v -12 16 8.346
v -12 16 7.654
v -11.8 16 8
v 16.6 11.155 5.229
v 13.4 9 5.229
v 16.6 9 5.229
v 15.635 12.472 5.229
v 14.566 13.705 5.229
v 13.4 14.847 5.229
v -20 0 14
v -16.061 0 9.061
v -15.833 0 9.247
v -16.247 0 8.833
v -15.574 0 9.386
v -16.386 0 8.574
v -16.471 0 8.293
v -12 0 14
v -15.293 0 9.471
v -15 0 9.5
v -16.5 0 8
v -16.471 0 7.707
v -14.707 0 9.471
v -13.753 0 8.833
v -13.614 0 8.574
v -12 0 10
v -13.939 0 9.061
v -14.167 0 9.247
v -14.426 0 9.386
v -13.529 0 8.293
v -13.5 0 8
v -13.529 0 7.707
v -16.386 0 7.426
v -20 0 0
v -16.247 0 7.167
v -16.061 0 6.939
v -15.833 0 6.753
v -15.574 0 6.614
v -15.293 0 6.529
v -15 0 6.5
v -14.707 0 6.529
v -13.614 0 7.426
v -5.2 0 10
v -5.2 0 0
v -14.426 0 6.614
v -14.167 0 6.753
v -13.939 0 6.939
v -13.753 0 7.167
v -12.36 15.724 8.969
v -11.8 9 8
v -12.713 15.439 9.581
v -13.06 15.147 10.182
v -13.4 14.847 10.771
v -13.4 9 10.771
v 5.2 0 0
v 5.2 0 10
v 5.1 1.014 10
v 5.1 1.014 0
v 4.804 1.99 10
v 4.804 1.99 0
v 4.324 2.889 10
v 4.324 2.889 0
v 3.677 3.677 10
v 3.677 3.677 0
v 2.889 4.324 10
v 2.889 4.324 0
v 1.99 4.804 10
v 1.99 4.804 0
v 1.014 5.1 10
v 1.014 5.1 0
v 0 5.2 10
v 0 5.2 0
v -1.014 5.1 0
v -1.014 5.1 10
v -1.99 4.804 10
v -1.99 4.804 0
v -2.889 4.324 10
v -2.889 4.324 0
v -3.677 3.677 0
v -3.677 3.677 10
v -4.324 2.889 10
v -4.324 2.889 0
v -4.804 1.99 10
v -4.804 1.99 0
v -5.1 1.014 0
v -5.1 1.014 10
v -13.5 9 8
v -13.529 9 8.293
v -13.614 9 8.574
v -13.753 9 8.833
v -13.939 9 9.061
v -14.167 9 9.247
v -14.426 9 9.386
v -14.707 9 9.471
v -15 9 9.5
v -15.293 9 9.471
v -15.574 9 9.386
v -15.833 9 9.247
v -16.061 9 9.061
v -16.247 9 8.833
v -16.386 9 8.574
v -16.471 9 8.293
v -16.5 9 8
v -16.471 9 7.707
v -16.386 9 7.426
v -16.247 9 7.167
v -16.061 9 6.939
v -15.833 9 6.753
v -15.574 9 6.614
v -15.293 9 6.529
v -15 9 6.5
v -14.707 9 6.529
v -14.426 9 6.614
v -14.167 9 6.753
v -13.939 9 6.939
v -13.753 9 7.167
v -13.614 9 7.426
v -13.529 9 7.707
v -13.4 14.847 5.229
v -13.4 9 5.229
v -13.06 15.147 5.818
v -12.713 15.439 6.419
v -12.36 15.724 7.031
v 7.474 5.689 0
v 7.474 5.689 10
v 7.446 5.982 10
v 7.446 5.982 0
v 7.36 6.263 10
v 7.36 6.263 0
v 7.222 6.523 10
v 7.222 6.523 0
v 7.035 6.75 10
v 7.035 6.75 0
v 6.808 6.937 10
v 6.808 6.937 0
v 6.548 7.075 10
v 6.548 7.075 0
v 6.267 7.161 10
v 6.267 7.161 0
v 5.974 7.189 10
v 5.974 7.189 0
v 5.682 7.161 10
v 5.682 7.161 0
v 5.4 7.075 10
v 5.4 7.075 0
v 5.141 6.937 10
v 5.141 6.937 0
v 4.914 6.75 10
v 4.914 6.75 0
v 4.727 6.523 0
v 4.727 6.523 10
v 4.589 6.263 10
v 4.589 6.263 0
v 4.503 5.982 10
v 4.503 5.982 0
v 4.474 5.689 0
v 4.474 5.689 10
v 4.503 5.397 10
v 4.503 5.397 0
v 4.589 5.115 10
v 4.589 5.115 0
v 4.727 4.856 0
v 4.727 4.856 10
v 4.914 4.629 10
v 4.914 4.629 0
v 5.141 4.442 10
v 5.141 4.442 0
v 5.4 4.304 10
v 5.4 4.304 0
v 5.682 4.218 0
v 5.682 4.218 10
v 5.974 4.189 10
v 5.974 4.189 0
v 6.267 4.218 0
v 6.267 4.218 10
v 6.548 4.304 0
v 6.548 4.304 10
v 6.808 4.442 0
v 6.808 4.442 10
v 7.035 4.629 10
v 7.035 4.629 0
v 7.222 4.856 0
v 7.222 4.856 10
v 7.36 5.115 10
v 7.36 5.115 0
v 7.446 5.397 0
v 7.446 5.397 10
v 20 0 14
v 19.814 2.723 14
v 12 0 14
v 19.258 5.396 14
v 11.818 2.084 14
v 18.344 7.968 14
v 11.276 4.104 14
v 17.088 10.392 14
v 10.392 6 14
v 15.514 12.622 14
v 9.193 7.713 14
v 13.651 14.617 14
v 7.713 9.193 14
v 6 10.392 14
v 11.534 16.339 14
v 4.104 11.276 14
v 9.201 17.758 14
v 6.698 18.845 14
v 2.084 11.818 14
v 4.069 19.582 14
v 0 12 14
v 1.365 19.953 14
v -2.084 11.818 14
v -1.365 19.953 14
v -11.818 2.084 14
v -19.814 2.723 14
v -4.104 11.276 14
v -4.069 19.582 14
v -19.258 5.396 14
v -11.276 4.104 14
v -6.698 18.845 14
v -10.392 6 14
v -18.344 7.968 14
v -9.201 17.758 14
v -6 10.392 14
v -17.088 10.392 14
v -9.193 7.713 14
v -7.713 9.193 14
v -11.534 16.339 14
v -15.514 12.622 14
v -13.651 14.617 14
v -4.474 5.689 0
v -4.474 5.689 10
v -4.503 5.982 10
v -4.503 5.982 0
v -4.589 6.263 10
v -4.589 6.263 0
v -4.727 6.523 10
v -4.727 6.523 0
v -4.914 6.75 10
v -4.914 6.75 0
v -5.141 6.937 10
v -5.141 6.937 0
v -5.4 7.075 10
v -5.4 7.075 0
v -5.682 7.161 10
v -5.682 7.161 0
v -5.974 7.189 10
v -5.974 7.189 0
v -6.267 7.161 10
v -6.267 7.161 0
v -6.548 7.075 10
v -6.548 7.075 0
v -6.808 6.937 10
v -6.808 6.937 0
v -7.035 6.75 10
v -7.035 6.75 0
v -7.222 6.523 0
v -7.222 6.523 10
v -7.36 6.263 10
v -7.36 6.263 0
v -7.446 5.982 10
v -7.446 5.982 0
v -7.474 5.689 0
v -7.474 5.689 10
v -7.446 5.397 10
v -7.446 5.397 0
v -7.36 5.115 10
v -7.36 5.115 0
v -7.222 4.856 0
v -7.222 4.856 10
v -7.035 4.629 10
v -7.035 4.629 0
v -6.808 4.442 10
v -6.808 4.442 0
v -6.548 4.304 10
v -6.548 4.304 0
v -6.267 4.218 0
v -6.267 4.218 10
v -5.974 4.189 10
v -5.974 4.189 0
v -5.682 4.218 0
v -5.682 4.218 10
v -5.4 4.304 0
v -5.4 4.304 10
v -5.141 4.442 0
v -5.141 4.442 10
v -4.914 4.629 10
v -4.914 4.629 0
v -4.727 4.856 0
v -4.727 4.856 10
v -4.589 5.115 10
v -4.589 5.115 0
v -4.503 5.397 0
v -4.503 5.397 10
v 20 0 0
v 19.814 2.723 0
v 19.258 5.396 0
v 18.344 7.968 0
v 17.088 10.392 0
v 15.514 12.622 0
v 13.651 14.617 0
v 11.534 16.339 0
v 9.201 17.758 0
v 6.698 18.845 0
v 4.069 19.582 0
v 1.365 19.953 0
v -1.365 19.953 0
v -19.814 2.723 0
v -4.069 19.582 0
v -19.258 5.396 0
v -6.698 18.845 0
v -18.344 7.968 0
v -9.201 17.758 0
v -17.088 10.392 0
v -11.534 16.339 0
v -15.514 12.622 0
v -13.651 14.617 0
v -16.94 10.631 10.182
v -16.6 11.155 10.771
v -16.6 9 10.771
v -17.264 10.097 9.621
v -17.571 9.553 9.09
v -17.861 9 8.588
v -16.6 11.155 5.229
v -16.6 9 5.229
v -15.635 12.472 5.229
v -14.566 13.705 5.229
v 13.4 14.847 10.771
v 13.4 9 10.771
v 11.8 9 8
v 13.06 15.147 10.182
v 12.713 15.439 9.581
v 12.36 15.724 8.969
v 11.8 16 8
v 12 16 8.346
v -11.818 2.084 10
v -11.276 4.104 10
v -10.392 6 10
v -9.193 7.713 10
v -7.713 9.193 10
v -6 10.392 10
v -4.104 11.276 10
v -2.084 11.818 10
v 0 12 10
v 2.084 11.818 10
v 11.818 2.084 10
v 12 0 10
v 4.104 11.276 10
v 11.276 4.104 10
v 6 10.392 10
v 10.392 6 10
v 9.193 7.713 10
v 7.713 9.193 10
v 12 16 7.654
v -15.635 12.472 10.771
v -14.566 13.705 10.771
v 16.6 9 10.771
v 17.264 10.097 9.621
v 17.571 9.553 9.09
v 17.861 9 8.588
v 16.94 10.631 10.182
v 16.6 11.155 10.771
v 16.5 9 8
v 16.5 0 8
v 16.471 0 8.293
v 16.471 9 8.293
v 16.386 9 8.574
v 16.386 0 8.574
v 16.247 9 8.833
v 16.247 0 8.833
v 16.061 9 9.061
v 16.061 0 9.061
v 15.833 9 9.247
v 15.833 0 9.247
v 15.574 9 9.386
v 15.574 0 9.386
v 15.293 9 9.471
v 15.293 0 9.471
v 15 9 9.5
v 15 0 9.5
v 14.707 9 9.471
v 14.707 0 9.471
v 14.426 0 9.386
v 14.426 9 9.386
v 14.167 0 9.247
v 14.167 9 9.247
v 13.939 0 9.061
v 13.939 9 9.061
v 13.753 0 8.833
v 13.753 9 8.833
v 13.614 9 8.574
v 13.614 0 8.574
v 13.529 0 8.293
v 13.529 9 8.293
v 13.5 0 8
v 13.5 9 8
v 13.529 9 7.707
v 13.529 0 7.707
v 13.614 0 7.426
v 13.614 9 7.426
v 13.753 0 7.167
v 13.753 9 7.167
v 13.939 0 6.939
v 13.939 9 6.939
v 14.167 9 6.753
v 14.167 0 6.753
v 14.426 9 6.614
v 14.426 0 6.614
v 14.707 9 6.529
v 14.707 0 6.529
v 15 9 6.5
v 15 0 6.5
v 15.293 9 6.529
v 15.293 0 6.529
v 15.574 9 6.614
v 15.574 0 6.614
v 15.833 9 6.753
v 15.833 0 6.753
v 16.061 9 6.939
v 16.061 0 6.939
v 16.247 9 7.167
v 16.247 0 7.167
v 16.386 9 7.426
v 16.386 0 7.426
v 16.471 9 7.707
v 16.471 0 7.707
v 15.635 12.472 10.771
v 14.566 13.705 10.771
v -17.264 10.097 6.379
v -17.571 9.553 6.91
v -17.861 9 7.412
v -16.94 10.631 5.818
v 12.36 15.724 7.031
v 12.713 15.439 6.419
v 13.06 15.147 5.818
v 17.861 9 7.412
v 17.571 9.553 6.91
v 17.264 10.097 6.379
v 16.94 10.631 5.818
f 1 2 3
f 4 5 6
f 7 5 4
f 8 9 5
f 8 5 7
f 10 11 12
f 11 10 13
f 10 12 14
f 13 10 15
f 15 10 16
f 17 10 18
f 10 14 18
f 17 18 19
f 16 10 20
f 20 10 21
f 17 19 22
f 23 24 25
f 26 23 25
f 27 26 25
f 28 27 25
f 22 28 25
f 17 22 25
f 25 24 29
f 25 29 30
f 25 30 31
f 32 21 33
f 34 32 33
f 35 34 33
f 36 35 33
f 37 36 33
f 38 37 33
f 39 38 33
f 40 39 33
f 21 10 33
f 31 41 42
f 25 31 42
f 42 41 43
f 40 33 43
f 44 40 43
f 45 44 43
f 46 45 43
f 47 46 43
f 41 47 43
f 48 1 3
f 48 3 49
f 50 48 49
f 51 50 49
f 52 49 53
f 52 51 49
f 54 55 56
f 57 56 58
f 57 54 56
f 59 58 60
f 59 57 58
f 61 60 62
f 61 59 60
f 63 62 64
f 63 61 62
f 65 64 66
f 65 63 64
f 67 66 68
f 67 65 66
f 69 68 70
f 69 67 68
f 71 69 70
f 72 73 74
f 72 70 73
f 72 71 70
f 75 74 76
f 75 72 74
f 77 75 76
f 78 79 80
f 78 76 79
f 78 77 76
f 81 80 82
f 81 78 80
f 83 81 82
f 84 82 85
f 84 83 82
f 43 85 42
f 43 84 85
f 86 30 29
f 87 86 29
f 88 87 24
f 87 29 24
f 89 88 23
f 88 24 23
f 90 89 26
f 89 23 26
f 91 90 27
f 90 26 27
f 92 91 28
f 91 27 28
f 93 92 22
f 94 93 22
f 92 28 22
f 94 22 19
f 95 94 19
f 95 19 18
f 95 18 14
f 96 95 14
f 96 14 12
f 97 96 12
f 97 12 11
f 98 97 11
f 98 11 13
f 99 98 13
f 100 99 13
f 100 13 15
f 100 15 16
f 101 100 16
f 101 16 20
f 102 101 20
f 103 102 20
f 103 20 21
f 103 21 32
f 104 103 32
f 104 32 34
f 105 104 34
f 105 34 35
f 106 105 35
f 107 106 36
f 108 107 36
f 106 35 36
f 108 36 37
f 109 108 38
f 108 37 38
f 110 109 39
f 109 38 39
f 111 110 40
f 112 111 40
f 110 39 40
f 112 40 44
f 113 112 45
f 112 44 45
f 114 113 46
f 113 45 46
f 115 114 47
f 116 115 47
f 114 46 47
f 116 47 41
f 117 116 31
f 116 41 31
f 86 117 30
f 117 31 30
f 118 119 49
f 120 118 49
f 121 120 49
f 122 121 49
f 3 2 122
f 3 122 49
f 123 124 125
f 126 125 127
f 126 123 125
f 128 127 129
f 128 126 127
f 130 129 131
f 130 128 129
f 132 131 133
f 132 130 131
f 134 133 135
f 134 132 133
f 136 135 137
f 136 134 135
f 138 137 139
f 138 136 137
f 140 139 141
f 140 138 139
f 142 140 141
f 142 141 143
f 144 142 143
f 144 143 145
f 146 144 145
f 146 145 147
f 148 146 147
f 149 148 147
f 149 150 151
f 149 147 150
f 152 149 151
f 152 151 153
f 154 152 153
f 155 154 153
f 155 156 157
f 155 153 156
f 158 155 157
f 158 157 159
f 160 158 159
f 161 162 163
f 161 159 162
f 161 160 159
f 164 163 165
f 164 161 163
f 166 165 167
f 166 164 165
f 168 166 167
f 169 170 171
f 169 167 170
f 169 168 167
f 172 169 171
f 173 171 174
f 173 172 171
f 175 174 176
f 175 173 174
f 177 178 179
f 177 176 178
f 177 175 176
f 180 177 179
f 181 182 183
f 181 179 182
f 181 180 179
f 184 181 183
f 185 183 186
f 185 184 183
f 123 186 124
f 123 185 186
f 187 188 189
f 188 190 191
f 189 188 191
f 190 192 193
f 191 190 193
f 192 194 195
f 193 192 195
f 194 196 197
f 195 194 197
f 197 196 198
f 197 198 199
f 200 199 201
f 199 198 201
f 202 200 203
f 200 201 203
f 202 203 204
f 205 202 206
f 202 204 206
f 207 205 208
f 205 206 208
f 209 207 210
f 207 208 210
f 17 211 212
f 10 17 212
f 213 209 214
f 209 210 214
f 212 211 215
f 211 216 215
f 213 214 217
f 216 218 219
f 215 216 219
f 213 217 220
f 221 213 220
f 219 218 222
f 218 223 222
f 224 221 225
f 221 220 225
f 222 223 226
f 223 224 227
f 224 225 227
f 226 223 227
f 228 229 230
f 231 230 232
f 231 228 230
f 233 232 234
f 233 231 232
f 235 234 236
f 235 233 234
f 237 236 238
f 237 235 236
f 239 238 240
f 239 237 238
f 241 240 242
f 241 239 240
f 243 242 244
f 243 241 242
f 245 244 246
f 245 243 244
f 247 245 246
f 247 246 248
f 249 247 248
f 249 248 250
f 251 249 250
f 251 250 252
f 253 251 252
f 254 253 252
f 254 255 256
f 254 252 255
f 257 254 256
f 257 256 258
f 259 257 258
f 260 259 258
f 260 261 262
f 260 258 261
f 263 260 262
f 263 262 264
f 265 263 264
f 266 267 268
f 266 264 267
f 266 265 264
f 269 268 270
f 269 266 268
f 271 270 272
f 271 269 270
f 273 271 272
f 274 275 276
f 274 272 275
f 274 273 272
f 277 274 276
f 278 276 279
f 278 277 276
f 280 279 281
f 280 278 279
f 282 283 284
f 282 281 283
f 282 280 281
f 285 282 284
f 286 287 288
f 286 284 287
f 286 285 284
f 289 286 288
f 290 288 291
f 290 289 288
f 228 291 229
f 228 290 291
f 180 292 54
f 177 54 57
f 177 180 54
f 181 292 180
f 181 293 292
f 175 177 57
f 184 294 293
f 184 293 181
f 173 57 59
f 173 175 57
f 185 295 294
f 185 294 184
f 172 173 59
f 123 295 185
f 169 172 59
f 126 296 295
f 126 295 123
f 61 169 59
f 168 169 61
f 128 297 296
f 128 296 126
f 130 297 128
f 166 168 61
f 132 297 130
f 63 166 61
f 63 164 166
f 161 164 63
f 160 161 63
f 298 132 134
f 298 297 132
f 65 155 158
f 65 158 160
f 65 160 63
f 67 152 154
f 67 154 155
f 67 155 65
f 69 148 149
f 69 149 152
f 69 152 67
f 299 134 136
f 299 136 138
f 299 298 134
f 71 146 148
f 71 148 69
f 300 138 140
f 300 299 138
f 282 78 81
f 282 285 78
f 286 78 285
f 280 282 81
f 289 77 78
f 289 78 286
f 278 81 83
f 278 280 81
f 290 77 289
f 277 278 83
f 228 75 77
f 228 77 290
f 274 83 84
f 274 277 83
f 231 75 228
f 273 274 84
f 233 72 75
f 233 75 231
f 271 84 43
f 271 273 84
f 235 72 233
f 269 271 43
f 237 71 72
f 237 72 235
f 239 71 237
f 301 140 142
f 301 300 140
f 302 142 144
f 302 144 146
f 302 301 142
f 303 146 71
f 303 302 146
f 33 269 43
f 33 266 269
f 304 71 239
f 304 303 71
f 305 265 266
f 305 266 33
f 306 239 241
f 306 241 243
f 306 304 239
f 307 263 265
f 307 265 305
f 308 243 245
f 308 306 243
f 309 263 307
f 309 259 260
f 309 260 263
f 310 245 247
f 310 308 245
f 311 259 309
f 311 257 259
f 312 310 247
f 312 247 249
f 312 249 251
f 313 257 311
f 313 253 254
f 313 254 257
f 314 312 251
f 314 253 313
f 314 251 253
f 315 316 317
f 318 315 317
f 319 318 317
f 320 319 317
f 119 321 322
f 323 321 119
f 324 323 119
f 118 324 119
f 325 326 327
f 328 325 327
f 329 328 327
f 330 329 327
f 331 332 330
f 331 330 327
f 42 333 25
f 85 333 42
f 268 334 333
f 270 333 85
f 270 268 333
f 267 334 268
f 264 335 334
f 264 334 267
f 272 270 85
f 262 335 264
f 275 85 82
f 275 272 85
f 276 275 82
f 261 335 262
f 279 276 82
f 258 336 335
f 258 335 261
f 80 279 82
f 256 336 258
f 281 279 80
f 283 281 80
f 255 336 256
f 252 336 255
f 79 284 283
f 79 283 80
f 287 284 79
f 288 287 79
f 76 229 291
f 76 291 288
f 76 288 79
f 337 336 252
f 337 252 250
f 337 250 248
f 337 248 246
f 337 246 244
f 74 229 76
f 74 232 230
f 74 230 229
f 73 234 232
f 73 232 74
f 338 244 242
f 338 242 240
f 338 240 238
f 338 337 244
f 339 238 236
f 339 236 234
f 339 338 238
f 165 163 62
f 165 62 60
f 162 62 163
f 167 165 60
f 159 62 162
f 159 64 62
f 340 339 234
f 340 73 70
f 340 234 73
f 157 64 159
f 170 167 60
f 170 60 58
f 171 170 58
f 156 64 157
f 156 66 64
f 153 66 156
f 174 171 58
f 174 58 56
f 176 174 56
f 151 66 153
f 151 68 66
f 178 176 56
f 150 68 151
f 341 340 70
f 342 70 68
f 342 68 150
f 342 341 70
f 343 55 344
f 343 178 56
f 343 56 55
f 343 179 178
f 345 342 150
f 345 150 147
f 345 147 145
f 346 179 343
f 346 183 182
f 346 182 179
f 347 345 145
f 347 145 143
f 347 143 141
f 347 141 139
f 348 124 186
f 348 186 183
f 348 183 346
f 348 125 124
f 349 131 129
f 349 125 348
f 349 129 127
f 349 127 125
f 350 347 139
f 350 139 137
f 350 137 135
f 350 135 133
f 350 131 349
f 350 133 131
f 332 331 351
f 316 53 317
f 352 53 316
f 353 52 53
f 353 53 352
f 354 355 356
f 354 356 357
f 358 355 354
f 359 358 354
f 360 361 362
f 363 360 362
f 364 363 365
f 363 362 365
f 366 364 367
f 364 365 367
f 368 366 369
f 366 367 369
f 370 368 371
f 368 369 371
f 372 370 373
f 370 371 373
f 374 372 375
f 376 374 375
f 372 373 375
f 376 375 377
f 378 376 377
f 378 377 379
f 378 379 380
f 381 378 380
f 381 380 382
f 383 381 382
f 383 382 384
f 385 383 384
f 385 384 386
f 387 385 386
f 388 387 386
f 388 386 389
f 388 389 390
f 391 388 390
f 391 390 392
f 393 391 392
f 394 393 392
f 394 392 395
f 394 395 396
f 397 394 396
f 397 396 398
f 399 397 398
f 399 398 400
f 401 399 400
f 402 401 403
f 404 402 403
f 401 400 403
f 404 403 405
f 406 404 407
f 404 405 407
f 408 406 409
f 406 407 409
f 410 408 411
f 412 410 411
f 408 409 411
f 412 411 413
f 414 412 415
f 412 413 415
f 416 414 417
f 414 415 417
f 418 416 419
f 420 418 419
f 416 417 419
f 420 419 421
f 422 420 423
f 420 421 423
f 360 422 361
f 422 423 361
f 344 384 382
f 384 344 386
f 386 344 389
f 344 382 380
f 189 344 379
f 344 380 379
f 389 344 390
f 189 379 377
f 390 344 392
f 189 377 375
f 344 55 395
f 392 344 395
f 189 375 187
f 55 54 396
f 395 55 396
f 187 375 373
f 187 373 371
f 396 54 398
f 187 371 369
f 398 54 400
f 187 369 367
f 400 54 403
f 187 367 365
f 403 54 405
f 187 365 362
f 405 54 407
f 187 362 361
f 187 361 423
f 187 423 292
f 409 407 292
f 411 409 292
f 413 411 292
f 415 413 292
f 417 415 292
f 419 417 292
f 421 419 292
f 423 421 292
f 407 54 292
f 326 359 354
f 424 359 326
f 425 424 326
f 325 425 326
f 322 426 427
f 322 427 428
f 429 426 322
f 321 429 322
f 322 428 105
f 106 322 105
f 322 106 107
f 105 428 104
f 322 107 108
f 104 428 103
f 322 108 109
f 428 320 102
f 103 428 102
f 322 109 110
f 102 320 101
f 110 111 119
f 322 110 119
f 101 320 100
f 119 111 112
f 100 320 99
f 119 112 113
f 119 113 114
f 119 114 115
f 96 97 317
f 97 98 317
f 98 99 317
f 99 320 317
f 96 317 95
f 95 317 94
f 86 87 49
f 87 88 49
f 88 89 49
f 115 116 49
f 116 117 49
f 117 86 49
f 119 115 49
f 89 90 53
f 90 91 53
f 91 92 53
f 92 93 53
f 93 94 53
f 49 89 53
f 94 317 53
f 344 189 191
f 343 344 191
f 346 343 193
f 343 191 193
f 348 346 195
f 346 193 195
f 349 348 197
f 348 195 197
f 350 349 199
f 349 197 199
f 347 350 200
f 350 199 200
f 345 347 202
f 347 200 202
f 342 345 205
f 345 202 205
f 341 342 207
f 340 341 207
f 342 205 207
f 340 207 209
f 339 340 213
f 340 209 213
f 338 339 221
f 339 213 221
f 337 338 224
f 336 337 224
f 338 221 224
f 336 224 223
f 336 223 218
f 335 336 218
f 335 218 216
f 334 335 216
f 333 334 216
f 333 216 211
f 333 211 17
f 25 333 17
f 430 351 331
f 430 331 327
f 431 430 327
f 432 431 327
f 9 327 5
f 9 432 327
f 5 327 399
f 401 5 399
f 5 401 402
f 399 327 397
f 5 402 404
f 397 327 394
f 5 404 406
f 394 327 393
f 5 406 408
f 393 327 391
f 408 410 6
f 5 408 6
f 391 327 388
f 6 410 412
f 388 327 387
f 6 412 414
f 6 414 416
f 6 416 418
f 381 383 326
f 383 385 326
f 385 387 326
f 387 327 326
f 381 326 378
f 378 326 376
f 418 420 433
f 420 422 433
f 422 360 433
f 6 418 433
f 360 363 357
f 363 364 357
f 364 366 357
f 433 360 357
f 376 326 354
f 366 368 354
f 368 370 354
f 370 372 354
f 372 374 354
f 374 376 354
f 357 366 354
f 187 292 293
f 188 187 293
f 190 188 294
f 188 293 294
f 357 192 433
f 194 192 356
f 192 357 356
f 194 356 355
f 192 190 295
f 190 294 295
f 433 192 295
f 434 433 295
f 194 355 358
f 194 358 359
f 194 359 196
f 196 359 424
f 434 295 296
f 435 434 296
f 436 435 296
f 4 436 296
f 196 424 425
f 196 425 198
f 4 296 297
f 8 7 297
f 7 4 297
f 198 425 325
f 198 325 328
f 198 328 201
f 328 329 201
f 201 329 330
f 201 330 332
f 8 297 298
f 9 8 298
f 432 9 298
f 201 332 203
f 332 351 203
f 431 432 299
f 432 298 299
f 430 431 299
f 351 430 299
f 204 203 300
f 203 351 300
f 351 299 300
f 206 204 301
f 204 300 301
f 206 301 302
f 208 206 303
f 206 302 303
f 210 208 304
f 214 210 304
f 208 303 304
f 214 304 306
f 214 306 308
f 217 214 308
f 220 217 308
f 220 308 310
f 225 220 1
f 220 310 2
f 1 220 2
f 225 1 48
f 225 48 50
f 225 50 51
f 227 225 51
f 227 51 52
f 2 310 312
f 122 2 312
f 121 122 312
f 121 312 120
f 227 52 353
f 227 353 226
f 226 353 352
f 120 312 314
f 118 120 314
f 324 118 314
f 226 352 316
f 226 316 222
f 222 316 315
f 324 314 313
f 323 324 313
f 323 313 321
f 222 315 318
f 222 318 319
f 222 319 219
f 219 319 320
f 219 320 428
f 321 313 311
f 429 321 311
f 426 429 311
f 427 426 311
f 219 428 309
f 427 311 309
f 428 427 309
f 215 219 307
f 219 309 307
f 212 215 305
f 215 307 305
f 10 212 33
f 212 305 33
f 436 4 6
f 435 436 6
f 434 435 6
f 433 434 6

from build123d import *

# Parameters (mm, degrees)
PAD003_DEPTH = 7
SKETCH002_R  = 1.5
PAD002_DEPTH = 15
SKETCH001_R  = 12
PAD001_DEPTH = 4
SKETCH004_R  = 1.5
PAD004_DEPTH = 14
PAD_DEPTH    = 14


with BuildPart() as nutflush:
    # Sketch003 → Pad003 (new body)
    with BuildSketch(Plane.XZ.offset(-16)):
        Polygon((-13.4, 5.228719), (-11.8, 8), (-13.4, 10.771281), (-16.6, 10.771281), (-18.2, 8), (-16.6, 5.228719), align=None)
        Polygon((16.6, 5.228719), (18.2, 8), (16.6, 10.771281), (13.4, 10.771281), (11.8, 8), (13.4, 5.228719), align=None)
    extrude(amount=PAD003_DEPTH)


with BuildPart() as mount:
    # Sketch002 → Pad002 (new body)
    with BuildSketch(Plane.XZ):
        with Locations((-15, 8)):
            Circle(SKETCH002_R)
        with Locations((15, 8)):
            Circle(SKETCH002_R)
    extrude(amount=-PAD002_DEPTH)


with BuildPart() as leadnutflush:
    # Sketch001 → Pad001 (new body)
    with BuildSketch(Plane.XY.offset(14)):
        Circle(SKETCH001_R)
    extrude(amount=-PAD001_DEPTH)


with BuildPart() as cutblock:
    # Sketch004 → Pad004 (new body)
    with BuildSketch(Plane.XY):
        with Locations((-5.974399, 5.689381)):
            Circle(SKETCH004_R)
        with Locations((5.974399, 5.689381)):
            Circle(SKETCH004_R)
        with Locations((-5.974399, -5.689381)):
            Circle(SKETCH004_R)
        with Locations((5.974399, -5.689381)):
            Circle(SKETCH004_R)
    extrude(amount=PAD004_DEPTH)

    # Fusion: union NutFlush, Mount, LeadNutFlush
    add(nutflush.part)
    add(mount.part)
    add(leadnutflush.part)


with BuildPart() as cut:
    # Sketch → Pad (new body)
    with BuildSketch(Plane.XY):
        with BuildLine():
            ThreePointArc((5.2, 0), (0, 5.2), (-5.2, 0))
            Line((-20, 0), (-5.2, 0))
            ThreePointArc((20, 0), (0, 20), (-20, 0))
            Line((5.2, 0), (20, 0))
        make_face()
    extrude(amount=PAD_DEPTH)

    # Cut: cut CutBlock
    add(cutblock.part, mode=Mode.SUBTRACT)


solid = cut.part
